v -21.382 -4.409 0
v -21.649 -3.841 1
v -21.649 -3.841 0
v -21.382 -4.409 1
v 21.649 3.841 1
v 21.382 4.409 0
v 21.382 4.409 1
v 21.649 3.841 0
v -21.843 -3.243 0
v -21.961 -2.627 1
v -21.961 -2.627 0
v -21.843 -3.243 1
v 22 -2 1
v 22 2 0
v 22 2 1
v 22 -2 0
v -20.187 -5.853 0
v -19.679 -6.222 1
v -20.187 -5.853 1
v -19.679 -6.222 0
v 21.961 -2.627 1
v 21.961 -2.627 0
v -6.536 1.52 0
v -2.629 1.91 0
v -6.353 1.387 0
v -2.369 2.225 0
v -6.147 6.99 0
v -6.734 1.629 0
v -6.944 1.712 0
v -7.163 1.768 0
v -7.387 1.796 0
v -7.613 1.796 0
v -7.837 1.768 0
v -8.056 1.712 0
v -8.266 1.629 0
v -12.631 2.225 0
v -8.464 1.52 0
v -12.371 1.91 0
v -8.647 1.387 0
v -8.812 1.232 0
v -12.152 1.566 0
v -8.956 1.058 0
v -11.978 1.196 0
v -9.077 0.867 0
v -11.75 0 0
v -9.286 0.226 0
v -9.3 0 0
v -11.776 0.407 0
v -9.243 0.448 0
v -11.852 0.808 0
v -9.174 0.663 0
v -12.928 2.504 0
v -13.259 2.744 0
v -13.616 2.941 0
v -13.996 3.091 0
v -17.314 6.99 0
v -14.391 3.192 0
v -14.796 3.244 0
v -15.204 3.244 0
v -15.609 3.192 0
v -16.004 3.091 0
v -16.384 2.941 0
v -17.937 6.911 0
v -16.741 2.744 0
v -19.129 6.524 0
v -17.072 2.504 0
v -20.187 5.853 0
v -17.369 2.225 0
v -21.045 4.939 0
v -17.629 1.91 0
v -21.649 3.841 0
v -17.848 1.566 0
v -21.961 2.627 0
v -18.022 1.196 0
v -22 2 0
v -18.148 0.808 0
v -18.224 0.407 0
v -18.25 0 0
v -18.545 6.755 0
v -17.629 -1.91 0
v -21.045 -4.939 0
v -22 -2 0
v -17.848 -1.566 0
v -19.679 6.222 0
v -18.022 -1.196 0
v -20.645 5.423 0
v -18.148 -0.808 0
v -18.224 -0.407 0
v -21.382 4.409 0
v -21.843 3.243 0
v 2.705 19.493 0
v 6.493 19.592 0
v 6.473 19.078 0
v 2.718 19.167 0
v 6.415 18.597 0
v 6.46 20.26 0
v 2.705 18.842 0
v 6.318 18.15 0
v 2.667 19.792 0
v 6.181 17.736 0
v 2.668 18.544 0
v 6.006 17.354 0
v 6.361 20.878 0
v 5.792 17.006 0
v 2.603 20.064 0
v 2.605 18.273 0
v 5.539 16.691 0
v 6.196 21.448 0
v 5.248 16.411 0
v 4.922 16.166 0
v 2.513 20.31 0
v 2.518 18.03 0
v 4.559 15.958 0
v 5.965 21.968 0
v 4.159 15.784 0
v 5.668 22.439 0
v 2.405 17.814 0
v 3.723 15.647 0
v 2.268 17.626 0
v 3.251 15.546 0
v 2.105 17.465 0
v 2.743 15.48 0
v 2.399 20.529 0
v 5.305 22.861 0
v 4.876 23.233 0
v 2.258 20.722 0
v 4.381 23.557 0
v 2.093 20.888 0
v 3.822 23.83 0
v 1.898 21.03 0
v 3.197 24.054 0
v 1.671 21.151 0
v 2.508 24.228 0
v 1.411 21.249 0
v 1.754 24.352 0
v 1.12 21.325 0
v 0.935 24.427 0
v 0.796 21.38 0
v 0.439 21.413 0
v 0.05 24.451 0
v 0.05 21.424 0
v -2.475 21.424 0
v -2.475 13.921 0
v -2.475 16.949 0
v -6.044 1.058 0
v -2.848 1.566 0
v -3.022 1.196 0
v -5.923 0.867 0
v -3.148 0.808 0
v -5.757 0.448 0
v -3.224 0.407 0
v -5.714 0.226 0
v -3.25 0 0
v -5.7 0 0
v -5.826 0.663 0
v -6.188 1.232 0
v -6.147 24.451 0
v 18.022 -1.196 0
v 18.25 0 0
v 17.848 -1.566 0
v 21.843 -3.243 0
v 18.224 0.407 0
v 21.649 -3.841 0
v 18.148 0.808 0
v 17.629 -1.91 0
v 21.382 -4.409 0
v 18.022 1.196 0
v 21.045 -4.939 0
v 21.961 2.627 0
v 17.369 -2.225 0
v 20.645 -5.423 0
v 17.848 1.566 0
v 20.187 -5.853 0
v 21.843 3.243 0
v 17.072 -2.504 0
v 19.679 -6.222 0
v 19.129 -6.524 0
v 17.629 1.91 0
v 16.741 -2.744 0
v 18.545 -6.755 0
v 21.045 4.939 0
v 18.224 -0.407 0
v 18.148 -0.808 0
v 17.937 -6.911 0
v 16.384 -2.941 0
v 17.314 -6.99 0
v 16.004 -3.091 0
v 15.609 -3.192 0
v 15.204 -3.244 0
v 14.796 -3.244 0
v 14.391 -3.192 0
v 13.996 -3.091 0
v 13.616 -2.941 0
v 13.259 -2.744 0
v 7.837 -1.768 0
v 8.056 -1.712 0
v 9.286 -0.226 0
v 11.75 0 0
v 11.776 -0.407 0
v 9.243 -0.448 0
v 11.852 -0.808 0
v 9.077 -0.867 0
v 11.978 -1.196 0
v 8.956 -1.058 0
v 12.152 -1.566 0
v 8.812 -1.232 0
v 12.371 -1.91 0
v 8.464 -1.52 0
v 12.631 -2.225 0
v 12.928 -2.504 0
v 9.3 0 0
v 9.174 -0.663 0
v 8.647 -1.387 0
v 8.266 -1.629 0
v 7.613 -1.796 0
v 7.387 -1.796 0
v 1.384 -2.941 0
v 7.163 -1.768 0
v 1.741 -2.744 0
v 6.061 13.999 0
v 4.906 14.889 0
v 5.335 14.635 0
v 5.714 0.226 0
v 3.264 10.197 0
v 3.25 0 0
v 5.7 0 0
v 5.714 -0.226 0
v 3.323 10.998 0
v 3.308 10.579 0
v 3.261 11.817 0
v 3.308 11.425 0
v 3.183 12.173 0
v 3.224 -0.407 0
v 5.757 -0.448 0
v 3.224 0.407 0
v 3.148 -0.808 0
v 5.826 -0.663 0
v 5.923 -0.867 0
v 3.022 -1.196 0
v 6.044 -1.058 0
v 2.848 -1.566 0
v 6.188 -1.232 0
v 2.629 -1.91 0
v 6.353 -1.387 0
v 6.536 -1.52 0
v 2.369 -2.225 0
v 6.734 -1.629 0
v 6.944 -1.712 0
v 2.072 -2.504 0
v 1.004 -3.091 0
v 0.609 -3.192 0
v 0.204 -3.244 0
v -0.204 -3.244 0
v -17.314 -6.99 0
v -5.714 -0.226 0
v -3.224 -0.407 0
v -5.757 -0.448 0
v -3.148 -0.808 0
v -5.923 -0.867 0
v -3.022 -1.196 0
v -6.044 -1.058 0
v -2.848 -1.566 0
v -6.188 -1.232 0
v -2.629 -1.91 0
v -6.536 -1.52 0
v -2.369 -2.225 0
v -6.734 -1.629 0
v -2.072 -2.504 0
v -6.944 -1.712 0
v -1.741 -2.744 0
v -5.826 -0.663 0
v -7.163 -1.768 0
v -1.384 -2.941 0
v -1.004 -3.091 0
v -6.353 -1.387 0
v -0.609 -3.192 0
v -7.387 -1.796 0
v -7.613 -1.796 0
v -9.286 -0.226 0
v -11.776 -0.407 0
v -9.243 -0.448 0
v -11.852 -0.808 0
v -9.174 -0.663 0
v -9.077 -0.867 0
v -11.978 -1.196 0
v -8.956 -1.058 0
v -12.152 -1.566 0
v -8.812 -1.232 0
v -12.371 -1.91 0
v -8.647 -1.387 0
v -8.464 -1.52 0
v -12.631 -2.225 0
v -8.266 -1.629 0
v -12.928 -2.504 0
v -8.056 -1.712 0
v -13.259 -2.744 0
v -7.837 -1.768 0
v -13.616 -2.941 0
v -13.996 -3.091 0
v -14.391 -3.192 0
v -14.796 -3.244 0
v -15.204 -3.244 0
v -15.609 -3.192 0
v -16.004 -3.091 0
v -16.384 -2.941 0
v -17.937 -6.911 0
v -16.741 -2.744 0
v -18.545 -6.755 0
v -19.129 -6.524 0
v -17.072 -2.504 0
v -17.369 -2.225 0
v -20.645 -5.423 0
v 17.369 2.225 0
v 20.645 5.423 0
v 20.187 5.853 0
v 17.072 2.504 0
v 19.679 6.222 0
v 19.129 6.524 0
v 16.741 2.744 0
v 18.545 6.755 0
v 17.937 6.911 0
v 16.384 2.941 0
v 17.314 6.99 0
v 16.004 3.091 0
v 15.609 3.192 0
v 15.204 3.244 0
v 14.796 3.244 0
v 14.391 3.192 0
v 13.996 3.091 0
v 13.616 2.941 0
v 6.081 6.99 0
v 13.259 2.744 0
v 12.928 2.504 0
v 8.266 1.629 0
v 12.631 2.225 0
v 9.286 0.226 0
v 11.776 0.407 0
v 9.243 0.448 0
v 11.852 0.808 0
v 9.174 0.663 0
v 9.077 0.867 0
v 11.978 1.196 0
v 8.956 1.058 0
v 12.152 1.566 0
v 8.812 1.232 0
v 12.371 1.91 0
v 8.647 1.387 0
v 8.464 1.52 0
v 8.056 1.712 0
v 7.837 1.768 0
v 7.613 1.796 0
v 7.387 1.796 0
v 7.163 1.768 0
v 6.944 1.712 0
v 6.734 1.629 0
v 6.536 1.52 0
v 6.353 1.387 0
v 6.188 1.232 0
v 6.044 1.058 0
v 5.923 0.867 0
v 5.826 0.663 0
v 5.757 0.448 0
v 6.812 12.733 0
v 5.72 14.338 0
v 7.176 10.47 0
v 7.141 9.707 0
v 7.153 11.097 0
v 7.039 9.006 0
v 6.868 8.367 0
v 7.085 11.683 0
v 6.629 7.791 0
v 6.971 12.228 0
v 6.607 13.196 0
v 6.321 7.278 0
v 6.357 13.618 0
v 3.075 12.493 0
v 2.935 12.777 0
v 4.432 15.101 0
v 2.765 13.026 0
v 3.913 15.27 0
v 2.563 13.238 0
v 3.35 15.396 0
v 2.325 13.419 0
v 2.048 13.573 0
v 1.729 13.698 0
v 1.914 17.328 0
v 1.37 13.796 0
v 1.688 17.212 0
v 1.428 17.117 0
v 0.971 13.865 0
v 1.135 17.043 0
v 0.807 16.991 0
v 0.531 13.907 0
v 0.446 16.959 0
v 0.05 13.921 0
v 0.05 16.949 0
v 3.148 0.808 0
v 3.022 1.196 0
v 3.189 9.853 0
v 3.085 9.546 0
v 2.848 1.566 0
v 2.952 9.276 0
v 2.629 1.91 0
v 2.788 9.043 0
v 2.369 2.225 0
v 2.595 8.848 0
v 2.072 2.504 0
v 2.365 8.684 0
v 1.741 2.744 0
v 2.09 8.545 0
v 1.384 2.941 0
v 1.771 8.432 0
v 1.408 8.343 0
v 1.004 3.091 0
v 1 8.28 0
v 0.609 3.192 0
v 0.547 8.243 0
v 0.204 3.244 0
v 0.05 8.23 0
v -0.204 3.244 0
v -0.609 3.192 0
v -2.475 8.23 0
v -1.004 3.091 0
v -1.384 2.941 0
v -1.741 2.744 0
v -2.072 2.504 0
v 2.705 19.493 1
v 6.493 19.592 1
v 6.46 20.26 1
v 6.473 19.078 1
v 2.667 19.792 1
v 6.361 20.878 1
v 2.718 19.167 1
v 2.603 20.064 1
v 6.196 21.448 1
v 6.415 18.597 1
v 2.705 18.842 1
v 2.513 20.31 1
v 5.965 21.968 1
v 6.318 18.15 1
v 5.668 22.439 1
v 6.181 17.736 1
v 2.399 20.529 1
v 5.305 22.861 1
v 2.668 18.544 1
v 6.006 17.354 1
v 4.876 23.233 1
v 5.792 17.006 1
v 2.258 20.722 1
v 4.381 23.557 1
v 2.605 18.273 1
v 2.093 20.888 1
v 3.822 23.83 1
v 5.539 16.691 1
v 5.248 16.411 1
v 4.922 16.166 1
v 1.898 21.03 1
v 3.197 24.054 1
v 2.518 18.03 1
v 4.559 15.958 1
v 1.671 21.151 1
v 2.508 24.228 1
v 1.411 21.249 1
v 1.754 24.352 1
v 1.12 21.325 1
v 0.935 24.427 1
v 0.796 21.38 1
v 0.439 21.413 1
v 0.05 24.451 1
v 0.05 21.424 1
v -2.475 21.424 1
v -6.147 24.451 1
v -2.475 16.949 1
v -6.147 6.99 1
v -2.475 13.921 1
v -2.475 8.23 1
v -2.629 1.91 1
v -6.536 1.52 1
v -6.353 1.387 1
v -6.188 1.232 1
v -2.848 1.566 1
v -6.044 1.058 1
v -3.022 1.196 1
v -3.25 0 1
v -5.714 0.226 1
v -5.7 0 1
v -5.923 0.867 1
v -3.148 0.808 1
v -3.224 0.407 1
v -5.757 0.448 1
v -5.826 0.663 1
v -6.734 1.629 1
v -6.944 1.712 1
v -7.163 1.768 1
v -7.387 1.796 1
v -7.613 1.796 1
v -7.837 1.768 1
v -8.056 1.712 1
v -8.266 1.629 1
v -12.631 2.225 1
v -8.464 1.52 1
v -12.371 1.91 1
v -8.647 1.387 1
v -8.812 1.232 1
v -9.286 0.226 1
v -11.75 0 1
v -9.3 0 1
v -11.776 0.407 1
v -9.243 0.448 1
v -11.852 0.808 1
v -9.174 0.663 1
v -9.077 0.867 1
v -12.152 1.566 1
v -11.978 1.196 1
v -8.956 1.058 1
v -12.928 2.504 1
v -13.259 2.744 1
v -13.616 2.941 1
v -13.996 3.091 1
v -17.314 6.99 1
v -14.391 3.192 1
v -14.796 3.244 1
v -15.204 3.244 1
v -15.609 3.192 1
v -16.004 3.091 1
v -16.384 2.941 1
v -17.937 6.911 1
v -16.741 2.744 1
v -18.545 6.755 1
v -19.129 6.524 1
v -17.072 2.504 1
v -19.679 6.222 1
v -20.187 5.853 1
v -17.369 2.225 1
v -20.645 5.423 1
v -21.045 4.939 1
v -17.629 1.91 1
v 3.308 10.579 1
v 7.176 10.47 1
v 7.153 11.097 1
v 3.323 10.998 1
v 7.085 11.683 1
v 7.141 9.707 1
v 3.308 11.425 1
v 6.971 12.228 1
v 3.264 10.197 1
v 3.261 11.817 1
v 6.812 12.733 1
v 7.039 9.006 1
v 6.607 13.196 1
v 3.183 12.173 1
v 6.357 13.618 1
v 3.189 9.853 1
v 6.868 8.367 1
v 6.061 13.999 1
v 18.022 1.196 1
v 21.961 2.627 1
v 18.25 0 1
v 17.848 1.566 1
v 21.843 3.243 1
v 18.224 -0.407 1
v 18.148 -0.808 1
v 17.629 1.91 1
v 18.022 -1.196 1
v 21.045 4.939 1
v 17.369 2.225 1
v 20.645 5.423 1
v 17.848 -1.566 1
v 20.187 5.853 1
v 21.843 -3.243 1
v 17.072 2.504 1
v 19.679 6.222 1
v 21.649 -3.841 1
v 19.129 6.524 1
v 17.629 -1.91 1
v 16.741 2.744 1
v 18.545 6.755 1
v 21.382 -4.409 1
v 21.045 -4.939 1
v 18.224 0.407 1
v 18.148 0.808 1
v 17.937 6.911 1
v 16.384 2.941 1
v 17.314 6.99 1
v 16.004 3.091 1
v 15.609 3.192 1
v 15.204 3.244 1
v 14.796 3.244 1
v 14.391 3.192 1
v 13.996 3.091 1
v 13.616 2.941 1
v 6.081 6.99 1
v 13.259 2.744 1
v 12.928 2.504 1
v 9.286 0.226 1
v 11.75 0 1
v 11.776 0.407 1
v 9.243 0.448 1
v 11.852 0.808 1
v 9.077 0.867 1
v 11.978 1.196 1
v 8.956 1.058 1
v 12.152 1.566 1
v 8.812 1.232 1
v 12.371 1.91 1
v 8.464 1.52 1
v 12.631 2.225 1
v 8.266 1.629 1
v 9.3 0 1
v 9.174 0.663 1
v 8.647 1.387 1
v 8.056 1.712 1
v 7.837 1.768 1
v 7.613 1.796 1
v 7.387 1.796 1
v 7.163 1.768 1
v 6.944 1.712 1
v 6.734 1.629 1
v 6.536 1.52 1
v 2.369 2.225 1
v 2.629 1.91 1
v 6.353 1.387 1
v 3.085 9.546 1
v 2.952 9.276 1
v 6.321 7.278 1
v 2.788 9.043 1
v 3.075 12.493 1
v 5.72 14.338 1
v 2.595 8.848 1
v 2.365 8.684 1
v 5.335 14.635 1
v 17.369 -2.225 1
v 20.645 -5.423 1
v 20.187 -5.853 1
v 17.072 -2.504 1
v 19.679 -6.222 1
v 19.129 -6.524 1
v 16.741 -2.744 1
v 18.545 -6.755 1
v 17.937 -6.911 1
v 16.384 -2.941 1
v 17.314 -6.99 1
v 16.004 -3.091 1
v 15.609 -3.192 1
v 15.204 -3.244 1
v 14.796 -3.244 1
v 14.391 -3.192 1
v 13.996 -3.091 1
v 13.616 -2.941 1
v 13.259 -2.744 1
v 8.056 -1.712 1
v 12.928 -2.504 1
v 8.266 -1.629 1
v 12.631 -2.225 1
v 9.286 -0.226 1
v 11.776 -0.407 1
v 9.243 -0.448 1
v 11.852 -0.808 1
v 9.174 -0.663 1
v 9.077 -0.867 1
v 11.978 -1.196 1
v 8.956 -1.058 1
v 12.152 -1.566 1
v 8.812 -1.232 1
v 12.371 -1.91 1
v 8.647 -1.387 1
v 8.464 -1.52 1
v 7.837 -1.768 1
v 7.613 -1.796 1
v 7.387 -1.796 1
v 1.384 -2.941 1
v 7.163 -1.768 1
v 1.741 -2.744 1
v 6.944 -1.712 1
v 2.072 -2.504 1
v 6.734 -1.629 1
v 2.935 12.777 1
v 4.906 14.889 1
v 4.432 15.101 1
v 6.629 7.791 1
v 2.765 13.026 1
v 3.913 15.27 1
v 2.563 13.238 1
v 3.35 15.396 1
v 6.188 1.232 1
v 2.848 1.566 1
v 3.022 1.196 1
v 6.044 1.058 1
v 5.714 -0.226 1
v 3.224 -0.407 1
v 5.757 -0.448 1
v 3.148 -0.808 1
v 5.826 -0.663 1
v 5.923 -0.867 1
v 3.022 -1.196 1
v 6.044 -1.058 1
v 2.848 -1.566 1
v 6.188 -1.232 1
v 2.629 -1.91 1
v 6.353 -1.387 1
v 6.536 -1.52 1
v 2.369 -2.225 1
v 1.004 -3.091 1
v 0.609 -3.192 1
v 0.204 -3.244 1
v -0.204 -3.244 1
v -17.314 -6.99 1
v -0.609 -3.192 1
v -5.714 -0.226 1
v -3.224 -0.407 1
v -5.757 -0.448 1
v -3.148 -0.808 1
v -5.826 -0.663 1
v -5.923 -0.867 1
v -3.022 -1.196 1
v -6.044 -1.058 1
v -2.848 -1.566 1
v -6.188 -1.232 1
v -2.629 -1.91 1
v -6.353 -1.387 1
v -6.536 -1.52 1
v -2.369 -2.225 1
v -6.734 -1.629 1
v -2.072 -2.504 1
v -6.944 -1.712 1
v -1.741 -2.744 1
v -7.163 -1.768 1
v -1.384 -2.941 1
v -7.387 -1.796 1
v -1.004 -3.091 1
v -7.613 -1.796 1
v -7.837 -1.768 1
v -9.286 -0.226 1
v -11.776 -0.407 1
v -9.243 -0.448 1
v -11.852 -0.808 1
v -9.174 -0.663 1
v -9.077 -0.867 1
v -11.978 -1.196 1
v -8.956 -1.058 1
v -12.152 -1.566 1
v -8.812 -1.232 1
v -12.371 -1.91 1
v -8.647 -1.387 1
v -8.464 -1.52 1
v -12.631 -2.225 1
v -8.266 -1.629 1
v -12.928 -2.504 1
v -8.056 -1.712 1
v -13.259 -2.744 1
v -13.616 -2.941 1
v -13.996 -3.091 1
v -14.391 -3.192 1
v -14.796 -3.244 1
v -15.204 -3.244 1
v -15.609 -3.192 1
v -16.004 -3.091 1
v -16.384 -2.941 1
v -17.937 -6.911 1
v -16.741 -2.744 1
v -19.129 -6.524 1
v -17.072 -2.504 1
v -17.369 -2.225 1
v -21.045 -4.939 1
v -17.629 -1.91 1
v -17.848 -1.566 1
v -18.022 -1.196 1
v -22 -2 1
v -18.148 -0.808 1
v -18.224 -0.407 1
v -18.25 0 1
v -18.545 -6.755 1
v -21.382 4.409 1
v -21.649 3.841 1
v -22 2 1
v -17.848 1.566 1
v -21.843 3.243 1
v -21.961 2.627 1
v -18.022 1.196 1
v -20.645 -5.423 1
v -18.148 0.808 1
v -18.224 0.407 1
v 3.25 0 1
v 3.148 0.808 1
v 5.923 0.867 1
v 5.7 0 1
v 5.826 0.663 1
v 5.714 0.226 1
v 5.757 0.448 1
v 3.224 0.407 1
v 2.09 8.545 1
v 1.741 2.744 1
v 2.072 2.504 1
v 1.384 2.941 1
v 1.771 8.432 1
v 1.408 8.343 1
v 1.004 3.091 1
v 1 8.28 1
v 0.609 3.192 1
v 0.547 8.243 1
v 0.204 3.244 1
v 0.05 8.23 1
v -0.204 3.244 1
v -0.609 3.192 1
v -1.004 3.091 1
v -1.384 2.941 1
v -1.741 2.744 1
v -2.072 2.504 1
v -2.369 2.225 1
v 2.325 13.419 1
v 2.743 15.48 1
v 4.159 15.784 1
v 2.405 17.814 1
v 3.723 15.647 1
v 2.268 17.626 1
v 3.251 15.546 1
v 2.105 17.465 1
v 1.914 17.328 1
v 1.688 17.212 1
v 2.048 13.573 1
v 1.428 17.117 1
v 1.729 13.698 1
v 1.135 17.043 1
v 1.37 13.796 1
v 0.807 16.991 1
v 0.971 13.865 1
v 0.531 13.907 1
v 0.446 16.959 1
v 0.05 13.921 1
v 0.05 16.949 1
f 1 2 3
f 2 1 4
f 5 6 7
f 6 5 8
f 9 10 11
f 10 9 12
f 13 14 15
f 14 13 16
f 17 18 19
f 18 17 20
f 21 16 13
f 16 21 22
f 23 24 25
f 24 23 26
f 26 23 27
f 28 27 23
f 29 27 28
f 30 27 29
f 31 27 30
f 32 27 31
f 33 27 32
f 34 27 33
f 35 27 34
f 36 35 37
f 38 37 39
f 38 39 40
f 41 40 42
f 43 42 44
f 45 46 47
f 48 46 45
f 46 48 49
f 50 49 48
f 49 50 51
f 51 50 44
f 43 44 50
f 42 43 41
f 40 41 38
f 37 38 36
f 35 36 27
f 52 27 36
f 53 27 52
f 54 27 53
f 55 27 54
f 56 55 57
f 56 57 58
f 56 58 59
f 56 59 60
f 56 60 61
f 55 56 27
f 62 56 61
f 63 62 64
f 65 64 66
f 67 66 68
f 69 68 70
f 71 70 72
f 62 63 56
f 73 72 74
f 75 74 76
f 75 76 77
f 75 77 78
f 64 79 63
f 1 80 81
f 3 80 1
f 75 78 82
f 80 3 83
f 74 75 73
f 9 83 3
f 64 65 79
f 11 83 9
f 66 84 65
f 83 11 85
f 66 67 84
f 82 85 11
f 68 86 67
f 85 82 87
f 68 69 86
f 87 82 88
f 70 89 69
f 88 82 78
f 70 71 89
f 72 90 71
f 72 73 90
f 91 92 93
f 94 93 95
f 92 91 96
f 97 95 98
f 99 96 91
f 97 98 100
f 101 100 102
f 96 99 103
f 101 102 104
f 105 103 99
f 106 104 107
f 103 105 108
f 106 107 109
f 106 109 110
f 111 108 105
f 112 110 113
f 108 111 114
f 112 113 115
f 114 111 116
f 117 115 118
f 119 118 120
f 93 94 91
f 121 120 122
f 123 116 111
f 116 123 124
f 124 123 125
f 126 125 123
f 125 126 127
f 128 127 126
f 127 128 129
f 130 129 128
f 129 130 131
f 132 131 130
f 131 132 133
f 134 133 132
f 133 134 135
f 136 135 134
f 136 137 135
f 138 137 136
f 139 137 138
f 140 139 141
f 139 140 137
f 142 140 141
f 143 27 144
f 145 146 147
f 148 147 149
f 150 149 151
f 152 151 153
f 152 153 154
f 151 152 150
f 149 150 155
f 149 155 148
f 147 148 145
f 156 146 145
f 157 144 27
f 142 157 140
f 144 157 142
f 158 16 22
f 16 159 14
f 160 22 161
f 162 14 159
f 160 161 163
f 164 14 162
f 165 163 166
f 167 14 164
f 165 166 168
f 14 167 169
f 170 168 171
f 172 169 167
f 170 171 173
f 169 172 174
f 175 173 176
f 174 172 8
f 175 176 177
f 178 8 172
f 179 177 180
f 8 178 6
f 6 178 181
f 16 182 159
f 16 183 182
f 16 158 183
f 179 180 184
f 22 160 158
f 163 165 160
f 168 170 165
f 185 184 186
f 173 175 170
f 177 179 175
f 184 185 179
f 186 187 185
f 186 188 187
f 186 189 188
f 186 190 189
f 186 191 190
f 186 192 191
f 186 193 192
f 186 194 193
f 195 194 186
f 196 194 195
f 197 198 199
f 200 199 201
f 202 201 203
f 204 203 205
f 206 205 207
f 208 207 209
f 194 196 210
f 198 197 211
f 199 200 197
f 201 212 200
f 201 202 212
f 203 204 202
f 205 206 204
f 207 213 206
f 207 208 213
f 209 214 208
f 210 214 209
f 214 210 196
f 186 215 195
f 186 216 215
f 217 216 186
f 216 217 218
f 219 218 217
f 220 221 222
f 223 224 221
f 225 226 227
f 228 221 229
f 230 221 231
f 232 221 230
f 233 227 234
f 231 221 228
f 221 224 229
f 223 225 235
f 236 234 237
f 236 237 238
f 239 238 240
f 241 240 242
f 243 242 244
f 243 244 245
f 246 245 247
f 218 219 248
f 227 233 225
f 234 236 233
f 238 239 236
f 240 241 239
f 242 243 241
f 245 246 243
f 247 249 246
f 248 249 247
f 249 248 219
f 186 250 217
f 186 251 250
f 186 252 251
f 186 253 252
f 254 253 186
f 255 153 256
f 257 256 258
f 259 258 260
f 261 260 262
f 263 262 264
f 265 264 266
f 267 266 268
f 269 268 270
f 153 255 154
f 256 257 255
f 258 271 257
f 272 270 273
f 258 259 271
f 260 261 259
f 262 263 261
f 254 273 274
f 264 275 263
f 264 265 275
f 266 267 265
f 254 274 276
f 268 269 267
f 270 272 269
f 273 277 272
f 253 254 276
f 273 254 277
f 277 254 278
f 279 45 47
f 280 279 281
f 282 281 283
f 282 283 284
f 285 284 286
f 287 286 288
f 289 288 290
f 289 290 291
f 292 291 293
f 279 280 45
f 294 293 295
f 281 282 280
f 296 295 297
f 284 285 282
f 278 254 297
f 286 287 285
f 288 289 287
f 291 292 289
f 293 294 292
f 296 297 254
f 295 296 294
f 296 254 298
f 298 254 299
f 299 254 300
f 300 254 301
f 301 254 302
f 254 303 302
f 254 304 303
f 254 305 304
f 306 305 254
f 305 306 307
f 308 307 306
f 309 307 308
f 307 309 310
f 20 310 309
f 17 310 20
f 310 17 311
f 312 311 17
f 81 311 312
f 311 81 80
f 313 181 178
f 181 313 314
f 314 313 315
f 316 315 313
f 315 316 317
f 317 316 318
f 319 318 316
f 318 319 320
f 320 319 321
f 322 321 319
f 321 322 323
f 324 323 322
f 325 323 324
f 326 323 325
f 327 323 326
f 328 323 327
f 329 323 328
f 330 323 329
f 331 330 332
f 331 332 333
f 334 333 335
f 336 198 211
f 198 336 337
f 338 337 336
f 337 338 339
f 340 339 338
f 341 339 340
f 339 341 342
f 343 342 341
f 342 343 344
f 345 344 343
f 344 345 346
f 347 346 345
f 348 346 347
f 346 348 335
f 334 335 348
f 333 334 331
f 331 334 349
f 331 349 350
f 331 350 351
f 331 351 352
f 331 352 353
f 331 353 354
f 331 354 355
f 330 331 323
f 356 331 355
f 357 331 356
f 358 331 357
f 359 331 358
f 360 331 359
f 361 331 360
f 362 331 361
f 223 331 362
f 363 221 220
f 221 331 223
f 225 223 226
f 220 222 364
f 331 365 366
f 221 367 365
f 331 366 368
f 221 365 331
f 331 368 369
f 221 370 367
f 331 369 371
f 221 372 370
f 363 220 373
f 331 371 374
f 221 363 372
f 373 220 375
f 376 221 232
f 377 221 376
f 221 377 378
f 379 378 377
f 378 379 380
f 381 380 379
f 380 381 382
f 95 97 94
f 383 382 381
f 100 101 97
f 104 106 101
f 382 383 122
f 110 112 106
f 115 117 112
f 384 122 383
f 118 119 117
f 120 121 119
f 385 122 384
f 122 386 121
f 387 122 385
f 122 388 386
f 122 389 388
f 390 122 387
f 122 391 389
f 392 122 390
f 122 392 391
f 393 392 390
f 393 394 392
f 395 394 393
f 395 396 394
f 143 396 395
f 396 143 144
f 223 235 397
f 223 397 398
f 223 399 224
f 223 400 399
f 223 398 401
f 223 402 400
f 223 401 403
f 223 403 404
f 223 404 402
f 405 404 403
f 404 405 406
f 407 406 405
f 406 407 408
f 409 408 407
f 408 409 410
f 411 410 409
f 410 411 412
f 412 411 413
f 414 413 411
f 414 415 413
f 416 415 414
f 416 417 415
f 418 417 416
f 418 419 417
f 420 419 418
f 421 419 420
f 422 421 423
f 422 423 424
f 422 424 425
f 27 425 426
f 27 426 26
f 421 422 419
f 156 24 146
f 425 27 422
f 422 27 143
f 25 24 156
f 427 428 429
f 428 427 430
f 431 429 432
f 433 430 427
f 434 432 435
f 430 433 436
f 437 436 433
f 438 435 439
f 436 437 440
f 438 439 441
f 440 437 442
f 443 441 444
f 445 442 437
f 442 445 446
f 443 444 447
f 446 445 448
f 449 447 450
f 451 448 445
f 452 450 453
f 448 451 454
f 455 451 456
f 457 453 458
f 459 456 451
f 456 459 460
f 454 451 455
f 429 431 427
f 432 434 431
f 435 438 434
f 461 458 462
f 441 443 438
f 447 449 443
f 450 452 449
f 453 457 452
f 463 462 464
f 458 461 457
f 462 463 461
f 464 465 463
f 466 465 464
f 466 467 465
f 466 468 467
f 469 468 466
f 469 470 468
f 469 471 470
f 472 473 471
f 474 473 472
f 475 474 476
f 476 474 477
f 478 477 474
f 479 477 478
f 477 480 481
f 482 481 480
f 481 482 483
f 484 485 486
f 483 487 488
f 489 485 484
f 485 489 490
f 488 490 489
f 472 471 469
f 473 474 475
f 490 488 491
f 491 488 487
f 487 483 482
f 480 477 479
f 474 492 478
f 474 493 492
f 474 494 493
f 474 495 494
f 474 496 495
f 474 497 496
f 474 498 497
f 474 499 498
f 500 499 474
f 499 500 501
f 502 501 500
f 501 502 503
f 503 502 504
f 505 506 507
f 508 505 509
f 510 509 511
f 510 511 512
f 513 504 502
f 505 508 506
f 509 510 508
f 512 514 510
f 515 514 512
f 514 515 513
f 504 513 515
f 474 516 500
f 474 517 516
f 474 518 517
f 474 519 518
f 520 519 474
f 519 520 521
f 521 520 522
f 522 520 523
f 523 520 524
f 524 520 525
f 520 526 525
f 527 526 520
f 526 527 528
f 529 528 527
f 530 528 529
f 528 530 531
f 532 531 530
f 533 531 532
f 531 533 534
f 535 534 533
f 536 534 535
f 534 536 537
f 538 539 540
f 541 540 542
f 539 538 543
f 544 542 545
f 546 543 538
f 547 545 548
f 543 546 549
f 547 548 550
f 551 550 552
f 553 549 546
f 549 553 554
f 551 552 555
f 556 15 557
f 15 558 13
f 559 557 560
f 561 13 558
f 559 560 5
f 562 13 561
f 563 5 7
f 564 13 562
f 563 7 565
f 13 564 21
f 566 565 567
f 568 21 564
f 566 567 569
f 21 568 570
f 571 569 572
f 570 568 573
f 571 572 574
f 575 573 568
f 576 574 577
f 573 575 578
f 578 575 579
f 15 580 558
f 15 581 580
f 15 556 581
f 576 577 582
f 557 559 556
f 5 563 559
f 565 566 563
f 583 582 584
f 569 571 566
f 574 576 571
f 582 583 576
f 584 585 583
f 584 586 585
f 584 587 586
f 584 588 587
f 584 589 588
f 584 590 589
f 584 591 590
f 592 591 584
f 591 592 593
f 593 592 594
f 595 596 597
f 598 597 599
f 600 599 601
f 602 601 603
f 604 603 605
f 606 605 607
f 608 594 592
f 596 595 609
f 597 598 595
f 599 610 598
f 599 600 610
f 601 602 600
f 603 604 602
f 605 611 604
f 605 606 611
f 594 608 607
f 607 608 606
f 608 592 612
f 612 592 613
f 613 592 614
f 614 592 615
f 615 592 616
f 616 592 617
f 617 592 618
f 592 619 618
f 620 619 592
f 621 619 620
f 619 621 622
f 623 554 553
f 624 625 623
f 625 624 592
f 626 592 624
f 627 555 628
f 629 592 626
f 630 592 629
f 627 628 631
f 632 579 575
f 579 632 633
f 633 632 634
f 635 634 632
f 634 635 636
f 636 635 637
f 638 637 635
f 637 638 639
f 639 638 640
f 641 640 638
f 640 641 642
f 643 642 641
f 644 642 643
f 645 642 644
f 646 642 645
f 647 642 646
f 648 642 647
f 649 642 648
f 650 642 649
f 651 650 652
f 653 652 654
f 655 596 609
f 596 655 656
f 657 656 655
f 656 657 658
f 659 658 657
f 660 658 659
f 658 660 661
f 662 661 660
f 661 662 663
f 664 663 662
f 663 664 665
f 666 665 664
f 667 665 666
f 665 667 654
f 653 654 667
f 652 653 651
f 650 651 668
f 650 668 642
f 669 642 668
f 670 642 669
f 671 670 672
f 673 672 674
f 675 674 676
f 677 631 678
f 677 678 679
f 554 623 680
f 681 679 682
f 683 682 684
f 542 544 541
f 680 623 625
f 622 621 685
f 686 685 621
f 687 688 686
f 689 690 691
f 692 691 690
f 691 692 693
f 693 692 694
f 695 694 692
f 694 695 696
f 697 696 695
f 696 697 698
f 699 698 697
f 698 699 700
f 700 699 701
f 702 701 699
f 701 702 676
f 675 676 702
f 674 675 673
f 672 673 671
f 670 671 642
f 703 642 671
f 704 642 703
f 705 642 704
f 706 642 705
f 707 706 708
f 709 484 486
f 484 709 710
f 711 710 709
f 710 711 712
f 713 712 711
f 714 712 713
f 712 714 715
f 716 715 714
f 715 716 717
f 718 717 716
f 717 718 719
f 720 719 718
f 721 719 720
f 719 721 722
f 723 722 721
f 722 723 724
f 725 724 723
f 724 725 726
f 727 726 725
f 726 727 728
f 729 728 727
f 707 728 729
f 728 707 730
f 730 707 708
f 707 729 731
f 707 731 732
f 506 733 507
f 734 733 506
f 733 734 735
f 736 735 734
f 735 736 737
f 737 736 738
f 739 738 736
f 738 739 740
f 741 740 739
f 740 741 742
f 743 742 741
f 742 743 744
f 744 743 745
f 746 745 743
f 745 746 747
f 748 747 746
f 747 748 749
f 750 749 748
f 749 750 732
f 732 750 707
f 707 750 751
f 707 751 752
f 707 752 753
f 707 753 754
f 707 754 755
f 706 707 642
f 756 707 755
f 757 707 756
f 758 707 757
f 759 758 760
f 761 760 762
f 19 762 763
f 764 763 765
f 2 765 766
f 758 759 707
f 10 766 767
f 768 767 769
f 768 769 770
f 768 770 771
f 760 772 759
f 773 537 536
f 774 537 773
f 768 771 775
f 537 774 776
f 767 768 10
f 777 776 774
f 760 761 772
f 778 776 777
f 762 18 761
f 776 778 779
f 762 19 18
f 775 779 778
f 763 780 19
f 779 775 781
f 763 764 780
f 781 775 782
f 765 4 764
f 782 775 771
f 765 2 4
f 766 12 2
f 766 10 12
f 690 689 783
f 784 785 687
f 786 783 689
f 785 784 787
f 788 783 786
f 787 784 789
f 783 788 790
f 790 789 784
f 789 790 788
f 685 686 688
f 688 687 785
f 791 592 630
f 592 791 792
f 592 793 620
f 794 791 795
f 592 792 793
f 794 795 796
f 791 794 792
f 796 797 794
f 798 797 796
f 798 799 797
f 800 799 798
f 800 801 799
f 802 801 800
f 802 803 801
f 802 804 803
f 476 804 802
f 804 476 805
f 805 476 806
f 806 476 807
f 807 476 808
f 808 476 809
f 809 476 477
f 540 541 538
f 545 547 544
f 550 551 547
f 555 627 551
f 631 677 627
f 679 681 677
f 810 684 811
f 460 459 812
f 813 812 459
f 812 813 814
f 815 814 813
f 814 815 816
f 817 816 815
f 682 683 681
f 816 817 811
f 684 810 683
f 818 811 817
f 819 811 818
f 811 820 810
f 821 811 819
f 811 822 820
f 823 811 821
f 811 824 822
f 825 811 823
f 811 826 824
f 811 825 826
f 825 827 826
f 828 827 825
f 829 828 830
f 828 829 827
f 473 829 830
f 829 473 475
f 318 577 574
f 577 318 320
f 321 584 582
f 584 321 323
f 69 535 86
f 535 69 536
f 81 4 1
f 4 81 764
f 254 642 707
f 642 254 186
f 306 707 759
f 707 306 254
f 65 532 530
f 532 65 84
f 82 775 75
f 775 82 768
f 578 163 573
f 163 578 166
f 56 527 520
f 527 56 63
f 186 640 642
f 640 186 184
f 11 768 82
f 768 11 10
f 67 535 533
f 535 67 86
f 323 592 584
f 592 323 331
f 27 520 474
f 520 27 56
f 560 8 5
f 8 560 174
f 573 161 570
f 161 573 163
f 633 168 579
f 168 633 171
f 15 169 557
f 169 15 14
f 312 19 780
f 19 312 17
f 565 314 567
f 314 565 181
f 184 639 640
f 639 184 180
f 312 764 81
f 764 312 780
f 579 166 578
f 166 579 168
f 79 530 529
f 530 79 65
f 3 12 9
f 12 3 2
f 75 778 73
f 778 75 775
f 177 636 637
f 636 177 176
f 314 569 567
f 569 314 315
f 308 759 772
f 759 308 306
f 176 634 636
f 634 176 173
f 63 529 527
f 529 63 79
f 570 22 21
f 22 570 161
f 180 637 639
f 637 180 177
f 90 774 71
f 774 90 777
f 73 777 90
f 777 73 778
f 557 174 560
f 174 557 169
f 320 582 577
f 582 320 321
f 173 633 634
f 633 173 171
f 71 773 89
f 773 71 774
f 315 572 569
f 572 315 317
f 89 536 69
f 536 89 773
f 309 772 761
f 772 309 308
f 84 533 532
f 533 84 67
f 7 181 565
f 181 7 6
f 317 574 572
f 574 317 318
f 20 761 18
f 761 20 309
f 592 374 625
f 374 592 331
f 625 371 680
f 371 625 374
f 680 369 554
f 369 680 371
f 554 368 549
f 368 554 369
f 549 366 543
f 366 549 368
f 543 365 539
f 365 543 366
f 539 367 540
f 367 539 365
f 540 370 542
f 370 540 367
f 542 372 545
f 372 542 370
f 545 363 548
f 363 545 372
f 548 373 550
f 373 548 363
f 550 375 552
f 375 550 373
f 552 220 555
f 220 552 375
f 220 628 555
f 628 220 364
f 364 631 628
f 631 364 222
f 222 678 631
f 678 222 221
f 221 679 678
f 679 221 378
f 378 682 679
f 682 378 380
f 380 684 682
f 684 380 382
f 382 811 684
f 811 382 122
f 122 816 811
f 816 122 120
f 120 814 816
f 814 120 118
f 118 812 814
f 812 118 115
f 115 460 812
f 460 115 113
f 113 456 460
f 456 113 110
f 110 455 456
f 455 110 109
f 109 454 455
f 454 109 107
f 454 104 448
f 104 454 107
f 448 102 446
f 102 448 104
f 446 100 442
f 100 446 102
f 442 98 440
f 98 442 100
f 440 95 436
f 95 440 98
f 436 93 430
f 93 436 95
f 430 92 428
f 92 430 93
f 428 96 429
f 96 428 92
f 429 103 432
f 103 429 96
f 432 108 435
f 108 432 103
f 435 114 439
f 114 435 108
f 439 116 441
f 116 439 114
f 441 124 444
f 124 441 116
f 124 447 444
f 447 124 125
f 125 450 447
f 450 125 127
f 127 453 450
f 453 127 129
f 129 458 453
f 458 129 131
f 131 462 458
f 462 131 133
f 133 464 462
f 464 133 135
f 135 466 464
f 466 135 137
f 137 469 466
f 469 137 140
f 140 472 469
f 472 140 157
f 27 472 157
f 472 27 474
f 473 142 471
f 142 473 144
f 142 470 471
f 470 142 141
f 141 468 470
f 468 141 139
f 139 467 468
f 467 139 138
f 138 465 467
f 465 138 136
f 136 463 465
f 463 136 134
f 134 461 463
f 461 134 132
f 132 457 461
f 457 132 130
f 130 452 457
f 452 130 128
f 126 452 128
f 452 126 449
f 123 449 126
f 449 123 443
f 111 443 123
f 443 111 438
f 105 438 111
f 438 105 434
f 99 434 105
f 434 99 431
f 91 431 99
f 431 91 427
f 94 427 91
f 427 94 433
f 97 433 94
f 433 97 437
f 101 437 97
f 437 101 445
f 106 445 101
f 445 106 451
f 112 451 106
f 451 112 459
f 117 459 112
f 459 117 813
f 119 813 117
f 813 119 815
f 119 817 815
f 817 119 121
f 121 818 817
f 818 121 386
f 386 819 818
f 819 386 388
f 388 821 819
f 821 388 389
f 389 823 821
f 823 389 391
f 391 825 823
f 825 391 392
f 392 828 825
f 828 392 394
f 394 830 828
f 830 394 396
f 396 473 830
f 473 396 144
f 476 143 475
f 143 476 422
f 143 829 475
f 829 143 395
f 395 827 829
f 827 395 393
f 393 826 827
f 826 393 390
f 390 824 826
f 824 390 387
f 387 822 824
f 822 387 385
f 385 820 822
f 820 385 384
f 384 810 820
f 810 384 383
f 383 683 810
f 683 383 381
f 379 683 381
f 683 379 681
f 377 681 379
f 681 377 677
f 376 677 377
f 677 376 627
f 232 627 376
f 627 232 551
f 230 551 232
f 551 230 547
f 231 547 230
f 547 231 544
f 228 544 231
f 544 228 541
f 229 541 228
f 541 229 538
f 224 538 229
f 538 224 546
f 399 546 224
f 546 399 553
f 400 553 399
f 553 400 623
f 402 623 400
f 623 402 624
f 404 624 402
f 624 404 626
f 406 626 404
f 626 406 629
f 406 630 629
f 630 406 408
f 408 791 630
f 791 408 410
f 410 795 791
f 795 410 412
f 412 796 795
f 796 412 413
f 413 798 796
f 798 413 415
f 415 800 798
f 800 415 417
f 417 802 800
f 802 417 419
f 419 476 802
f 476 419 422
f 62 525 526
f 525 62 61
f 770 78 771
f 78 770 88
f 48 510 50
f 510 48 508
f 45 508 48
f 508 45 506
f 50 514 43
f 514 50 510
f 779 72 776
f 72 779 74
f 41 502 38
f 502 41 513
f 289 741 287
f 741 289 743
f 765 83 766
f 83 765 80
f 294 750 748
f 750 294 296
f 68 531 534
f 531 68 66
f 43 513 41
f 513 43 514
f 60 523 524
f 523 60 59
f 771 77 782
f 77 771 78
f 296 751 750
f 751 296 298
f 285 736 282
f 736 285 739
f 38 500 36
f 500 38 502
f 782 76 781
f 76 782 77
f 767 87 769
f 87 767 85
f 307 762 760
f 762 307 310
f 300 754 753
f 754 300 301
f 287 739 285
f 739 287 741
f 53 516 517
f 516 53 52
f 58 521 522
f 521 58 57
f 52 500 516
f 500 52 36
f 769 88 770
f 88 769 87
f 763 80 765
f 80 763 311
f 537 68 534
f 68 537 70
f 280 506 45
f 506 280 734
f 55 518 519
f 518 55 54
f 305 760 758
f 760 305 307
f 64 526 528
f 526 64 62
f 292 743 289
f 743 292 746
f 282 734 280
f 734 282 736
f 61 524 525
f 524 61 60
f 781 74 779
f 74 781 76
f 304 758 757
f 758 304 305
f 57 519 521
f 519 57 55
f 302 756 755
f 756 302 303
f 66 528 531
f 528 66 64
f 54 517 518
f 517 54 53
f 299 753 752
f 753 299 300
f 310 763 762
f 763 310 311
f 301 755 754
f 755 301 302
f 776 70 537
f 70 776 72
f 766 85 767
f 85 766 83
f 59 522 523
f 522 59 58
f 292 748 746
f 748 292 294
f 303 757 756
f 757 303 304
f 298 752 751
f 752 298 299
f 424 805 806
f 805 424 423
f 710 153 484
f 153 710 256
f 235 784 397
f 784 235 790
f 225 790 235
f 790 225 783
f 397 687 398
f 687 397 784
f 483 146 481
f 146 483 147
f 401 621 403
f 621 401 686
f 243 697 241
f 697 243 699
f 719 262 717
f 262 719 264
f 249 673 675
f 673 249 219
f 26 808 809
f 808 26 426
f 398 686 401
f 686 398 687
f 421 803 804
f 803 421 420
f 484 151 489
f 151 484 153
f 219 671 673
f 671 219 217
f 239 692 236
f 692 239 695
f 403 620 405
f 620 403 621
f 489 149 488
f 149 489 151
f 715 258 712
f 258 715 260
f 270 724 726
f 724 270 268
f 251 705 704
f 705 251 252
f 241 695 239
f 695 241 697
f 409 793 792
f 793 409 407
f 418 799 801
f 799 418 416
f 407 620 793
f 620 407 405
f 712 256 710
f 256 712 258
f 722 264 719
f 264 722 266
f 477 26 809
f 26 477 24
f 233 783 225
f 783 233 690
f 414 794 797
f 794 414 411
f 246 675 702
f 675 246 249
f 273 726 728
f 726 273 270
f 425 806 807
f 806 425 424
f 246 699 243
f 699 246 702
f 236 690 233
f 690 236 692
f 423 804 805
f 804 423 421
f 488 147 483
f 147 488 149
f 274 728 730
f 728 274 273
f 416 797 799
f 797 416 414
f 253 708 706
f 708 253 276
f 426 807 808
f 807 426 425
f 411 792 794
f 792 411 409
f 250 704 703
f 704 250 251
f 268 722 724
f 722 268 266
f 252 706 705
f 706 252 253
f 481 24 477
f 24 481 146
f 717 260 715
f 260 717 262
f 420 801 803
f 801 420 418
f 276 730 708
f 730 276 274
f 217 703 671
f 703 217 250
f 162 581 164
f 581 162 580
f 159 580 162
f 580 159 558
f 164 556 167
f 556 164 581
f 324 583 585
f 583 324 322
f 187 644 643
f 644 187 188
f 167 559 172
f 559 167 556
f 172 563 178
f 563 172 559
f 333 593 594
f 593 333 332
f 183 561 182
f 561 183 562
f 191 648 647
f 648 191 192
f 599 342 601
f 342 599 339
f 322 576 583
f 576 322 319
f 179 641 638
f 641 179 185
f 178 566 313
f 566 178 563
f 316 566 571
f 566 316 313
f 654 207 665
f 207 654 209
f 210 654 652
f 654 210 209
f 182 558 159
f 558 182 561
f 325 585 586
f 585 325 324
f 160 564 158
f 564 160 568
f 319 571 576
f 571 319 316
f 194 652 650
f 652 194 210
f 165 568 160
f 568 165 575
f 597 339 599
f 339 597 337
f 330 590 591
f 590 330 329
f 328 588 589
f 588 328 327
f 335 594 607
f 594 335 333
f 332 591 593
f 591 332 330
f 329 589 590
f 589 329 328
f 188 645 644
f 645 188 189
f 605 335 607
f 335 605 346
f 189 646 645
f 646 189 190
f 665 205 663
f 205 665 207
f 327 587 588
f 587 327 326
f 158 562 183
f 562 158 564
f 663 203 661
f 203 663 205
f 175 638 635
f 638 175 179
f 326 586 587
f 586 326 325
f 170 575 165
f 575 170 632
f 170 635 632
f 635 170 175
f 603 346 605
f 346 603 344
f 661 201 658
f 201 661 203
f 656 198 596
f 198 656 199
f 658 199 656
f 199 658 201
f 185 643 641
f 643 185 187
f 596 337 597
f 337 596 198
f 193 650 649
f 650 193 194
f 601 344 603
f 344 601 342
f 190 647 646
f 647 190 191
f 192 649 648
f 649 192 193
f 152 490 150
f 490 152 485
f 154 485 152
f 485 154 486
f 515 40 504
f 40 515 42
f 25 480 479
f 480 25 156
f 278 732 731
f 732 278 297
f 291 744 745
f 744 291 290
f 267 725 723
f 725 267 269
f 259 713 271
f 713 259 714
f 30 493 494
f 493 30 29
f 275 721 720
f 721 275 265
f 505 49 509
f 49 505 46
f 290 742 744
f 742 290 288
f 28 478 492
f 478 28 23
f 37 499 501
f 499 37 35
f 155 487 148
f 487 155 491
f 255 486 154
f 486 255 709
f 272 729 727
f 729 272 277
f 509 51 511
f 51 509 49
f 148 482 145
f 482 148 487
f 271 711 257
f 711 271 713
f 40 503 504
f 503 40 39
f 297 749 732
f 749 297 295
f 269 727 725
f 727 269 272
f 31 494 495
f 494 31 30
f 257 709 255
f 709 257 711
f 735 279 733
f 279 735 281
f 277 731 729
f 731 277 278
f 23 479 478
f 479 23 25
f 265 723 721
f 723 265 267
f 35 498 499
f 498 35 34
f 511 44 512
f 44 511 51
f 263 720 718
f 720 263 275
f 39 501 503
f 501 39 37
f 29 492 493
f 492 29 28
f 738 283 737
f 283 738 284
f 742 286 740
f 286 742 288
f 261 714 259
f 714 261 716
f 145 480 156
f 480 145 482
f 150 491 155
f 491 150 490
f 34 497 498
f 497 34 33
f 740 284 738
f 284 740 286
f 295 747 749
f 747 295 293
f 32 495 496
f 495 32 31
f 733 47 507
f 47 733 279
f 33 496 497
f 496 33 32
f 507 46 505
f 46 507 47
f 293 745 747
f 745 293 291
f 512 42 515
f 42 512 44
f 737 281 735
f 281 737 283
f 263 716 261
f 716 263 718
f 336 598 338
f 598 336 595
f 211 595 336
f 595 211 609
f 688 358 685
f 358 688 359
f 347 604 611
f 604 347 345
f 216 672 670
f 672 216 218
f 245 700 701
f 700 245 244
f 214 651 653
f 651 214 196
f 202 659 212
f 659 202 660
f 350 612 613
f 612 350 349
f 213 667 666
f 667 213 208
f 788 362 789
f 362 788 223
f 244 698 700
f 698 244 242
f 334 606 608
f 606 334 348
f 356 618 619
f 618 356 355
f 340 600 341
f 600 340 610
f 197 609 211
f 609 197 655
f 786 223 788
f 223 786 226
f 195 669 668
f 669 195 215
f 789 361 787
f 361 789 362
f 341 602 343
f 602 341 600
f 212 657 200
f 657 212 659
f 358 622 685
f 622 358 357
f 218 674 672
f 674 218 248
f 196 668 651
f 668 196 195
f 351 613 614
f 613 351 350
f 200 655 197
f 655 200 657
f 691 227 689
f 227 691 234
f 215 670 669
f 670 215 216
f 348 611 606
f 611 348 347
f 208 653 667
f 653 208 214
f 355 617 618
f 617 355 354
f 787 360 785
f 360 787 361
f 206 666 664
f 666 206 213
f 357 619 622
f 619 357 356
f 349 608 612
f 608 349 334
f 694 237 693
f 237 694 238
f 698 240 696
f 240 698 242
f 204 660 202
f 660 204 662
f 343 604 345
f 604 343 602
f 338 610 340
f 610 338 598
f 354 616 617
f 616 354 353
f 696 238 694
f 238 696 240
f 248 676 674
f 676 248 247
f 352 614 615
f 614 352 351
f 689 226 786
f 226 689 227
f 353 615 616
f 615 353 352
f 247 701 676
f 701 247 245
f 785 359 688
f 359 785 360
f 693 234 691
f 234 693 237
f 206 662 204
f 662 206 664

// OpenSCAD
$fn = 50;


difference() {
	union() {
		hull() {
			translate(v = [-17.0000000000, 2.0000000000, 0]) {
				cylinder(h = 1, r = 5);
			}
			translate(v = [17.0000000000, 2.0000000000, 0]) {
				cylinder(h = 1, r = 5);
			}
			translate(v = [-17.0000000000, -2.0000000000, 0]) {
				cylinder(h = 1, r = 5);
			}
			translate(v = [17.0000000000, -2.0000000000, 0]) {
				cylinder(h = 1, r = 5);
			}
		}
		translate(v = [0, 24, 0]) {
			linear_extrude(height = 1) {
				text(font = "DejaVu Sans Mono:style=Bold", halign = "center", size = 19.0000000000, text = "B", valign = "top");
			}
		}
	}
	union() {
		translate(v = [-15.0000000000, 0.0000000000, 0]) {
			translate(v = [0, 0, -100]) {
				cylinder(h = 200, r = 3.2500000000);
			}
		}
		translate(v = [0, 0, -100]) {
			cylinder(h = 200, r = 3.2500000000);
		}
		translate(v = [15.0000000000, 0.0000000000, 0]) {
			translate(v = [0, 0, -100]) {
				cylinder(h = 200, r = 3.2500000000);
			}
		}
		translate(v = [-15.0000000000, 0.0000000000, 0]) {
			translate(v = [0, 0, -100]) {
				cylinder(h = 200, r = 1.8000000000);
			}
		}
		translate(v = [-7.5000000000, 0.0000000000, 0]) {
			translate(v = [0, 0, -100]) {
				cylinder(h = 200, r = 1.8000000000);
			}
		}
		translate(v = [0, 0, -100]) {
			cylinder(h = 200, r = 1.8000000000);
		}
		translate(v = [7.5000000000, 0.0000000000, 0]) {
			translate(v = [0, 0, -100]) {
				cylinder(h = 200, r = 1.8000000000);
			}
		}
		translate(v = [15.0000000000, 0.0000000000, 0]) {
			translate(v = [0, 0, -100]) {
				cylinder(h = 200, r = 1.8000000000);
			}
		}
	}
}
